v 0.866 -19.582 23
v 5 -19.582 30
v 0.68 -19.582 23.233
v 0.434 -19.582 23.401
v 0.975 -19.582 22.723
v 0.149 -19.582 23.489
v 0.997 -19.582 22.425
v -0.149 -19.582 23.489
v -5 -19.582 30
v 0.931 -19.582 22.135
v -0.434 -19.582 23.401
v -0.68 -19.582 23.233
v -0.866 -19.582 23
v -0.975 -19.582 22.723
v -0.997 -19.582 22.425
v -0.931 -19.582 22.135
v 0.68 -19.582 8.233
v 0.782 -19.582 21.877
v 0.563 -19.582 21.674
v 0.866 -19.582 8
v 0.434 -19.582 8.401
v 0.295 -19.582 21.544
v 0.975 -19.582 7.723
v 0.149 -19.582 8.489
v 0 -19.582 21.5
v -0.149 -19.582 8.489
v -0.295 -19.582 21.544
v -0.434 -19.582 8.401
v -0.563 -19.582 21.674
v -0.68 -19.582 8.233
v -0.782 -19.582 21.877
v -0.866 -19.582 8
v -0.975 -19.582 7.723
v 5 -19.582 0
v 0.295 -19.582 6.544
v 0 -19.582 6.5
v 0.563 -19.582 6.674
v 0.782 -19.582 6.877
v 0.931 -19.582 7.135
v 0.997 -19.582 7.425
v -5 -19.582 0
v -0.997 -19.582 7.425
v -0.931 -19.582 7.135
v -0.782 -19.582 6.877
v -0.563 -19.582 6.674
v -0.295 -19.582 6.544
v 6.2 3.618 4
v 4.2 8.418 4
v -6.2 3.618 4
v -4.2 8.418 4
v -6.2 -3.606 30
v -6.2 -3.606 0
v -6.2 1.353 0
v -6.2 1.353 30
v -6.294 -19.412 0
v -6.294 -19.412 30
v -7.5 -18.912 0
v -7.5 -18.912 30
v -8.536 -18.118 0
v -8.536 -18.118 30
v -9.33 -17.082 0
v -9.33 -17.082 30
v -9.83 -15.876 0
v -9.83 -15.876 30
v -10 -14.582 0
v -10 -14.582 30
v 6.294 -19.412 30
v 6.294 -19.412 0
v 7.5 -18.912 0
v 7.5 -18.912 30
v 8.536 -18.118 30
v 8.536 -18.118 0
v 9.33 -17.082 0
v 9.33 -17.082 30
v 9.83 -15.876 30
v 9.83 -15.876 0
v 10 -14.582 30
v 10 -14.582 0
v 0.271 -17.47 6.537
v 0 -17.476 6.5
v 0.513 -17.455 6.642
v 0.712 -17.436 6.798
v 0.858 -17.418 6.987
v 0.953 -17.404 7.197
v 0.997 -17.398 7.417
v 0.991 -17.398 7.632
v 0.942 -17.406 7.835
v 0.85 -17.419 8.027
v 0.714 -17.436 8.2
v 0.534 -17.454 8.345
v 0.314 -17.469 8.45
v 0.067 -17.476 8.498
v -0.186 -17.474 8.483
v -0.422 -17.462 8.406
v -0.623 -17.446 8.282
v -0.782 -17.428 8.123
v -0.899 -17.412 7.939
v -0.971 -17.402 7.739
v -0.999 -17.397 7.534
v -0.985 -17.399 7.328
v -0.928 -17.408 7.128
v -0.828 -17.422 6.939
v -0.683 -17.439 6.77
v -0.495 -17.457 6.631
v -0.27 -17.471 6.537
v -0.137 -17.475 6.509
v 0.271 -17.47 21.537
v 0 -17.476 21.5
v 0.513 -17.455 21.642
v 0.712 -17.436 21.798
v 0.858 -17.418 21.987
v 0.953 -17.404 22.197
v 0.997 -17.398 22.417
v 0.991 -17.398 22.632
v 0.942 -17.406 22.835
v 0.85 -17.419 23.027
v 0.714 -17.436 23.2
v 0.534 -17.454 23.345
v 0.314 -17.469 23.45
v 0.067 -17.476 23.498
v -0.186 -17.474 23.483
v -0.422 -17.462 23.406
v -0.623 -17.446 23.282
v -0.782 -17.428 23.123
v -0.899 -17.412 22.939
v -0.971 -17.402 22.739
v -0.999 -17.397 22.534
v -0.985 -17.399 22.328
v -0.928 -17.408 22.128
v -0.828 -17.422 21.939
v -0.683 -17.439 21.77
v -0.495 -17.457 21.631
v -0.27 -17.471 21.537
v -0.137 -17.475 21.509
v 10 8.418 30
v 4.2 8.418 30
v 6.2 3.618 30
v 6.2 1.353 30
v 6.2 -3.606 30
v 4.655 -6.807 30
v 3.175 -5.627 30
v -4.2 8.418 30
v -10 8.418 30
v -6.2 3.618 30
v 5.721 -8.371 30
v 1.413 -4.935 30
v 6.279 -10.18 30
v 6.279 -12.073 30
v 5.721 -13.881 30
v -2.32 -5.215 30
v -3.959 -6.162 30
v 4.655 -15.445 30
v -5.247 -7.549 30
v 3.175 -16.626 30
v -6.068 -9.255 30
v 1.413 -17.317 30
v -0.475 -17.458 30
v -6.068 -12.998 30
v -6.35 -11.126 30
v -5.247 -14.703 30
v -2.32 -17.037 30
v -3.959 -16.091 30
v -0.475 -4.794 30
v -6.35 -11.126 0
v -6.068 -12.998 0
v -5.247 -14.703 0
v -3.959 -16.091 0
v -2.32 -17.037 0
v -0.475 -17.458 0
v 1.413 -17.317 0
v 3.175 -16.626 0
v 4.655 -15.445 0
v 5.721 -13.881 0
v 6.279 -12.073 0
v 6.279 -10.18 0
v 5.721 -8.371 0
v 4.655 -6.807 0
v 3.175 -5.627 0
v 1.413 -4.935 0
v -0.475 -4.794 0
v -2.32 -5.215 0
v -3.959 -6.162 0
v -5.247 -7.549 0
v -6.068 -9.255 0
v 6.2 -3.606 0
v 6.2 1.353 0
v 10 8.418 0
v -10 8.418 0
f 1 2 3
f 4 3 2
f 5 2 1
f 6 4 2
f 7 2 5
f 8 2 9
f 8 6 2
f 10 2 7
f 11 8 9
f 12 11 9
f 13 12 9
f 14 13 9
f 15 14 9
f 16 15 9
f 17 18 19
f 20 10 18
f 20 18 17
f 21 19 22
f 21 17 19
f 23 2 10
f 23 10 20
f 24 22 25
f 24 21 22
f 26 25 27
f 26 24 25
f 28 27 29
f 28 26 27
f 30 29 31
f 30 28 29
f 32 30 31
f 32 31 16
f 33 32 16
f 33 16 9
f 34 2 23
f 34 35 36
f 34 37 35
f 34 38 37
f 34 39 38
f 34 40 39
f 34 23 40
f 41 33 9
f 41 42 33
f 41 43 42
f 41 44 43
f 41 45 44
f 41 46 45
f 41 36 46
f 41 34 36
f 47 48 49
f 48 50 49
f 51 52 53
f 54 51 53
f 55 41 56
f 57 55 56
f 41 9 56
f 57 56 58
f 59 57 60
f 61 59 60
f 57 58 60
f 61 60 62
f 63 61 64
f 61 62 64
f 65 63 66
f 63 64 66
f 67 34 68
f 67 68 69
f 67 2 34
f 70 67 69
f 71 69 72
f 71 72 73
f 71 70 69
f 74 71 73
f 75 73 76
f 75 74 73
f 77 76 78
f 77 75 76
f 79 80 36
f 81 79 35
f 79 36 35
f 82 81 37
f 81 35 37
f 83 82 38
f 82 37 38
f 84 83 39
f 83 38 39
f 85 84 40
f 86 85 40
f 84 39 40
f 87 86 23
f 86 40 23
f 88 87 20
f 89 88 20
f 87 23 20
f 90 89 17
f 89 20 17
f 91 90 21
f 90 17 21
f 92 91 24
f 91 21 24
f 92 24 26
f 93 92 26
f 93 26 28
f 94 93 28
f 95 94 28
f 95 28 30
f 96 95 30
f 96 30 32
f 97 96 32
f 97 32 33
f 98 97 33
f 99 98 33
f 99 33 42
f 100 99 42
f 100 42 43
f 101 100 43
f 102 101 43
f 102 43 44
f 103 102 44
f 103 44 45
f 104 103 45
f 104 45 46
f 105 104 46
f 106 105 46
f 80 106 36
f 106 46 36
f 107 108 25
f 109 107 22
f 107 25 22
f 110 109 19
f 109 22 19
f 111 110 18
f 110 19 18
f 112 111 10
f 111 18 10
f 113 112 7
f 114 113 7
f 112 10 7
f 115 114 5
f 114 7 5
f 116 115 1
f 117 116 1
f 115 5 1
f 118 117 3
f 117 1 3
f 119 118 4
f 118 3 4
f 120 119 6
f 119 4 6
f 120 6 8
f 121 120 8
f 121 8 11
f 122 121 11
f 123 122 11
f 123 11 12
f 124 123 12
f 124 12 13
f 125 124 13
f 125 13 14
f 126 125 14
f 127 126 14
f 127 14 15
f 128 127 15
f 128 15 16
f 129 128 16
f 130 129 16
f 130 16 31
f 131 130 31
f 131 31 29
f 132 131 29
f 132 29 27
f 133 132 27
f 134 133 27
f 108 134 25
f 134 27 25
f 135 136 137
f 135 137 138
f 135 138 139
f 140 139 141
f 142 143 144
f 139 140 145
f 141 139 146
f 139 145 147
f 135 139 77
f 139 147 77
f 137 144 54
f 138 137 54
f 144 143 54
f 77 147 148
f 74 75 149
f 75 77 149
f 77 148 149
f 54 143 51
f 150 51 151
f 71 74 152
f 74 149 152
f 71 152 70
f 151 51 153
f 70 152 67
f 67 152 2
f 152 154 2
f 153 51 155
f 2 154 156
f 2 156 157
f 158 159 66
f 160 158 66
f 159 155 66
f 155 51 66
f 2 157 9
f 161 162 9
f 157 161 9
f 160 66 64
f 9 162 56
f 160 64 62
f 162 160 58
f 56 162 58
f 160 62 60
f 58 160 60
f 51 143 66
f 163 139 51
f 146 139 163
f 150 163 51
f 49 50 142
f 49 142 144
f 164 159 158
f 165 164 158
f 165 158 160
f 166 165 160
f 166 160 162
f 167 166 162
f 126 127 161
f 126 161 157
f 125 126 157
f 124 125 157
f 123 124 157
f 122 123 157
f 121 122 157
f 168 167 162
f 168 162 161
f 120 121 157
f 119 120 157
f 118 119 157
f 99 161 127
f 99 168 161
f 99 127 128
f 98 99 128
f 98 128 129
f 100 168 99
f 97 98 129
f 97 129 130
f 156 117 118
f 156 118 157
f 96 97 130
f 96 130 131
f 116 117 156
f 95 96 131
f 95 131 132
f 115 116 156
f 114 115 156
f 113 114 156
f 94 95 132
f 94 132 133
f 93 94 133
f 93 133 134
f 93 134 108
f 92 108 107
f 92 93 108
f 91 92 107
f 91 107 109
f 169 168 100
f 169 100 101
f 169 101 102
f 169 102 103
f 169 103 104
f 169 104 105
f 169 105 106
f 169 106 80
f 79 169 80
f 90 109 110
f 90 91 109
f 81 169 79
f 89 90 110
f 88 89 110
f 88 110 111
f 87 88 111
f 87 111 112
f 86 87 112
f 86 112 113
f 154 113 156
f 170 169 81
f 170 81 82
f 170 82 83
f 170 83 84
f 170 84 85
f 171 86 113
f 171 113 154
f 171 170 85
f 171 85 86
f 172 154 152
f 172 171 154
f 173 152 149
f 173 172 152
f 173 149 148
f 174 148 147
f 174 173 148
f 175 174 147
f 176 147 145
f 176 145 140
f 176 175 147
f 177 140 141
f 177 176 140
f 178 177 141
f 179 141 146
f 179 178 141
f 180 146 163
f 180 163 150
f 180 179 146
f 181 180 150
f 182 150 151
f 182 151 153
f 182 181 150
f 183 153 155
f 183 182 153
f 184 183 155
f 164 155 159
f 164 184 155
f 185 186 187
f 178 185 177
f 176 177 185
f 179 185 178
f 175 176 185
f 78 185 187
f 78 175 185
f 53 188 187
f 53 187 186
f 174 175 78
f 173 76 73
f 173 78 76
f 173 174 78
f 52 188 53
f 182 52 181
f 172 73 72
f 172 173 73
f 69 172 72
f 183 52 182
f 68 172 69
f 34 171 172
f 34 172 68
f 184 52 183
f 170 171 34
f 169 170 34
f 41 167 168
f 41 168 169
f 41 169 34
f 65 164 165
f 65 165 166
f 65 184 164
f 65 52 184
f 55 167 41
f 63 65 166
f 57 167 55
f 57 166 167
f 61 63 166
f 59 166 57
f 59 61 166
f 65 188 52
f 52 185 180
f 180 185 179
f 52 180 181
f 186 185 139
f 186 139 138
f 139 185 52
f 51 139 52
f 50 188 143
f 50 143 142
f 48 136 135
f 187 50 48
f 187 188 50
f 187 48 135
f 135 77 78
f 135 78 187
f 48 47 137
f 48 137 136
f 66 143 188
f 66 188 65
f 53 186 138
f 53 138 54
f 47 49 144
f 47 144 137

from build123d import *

# Parameters (mm, degrees)
ESBO_O1_W                = 4.958931368
ESBO_O1_H                = 12.4
RESSALTO_EXTRUS_O1_DEPTH = 30
RESSALTO_EXTRUS_O2_DEPTH = 4
FILETE1_R                = 5
ESBO_O3_R                = 1
CORTE_EXTRUS_O1_DEPTH    = 4


with BuildPart() as part:
    # Esboço1 → Ressalto-extrusão1 (new body)
    with BuildSketch(Plane(origin=(0, 0, 0), x_dir=(0, 1, 0), z_dir=(0, 0, 1))):
        Polygon((3.617797035, 6.2), (3.617797035, -6.2), (8.417797035, -4.2), (8.417797035, -10), (-11.126254615, -10), (-19.582202965, -10), (-19.582202965, 10), (-11.126254615, 10), (8.417797035, 10), (8.417797035, 4.2), align=None)
        with Locations((-1.126254615, 0)):
            Rectangle(ESBO_O1_W, ESBO_O1_H, mode=Mode.SUBTRACT)
        with BuildLine():
            ThreePointArc((-11.126254615, -6.35), (-4.776254615, 0), (-11.126254615, 6.35))
            ThreePointArc((-11.126254615, 6.35), (-17.476254615, 0), (-11.126254615, -6.35))
        make_face(mode=Mode.SUBTRACT)
    extrude(amount=RESSALTO_EXTRUS_O1_DEPTH)

    # Esboço2 → Ressalto-extrusão2 (add)
    with BuildSketch(Plane(origin=(0, 0, 0), x_dir=(0, 1, 0), z_dir=(0, 0, 1))):
        Polygon((8.417797035, -4.2), (3.617797035, -6.2), (3.617797035, 6.2), (8.417797035, 4.2), align=None)
    extrude(amount=RESSALTO_EXTRUS_O2_DEPTH)

    # Filete1
    filete1_edges = [part.edges().sort_by_distance(p)[0] for p in [
        (10, -19.582202965, 15),
        (-10, -19.582202965, 15),
    ]]
    fillet(filete1_edges, radius=FILETE1_R)

    # Esboço3 → Corte-extrusão1 (cut)
    with BuildSketch(Plane.XZ.offset(19.582202965)):
        with Locations(Location((0, 22.5, 0), (0, 0, 270))):
            Circle(ESBO_O3_R)
        with Locations(Location((0, 7.5, 0), (0, 0, 270))):
            Circle(ESBO_O3_R)
    extrude(amount=-CORTE_EXTRUS_O1_DEPTH, mode=Mode.SUBTRACT)


solid = part.part
